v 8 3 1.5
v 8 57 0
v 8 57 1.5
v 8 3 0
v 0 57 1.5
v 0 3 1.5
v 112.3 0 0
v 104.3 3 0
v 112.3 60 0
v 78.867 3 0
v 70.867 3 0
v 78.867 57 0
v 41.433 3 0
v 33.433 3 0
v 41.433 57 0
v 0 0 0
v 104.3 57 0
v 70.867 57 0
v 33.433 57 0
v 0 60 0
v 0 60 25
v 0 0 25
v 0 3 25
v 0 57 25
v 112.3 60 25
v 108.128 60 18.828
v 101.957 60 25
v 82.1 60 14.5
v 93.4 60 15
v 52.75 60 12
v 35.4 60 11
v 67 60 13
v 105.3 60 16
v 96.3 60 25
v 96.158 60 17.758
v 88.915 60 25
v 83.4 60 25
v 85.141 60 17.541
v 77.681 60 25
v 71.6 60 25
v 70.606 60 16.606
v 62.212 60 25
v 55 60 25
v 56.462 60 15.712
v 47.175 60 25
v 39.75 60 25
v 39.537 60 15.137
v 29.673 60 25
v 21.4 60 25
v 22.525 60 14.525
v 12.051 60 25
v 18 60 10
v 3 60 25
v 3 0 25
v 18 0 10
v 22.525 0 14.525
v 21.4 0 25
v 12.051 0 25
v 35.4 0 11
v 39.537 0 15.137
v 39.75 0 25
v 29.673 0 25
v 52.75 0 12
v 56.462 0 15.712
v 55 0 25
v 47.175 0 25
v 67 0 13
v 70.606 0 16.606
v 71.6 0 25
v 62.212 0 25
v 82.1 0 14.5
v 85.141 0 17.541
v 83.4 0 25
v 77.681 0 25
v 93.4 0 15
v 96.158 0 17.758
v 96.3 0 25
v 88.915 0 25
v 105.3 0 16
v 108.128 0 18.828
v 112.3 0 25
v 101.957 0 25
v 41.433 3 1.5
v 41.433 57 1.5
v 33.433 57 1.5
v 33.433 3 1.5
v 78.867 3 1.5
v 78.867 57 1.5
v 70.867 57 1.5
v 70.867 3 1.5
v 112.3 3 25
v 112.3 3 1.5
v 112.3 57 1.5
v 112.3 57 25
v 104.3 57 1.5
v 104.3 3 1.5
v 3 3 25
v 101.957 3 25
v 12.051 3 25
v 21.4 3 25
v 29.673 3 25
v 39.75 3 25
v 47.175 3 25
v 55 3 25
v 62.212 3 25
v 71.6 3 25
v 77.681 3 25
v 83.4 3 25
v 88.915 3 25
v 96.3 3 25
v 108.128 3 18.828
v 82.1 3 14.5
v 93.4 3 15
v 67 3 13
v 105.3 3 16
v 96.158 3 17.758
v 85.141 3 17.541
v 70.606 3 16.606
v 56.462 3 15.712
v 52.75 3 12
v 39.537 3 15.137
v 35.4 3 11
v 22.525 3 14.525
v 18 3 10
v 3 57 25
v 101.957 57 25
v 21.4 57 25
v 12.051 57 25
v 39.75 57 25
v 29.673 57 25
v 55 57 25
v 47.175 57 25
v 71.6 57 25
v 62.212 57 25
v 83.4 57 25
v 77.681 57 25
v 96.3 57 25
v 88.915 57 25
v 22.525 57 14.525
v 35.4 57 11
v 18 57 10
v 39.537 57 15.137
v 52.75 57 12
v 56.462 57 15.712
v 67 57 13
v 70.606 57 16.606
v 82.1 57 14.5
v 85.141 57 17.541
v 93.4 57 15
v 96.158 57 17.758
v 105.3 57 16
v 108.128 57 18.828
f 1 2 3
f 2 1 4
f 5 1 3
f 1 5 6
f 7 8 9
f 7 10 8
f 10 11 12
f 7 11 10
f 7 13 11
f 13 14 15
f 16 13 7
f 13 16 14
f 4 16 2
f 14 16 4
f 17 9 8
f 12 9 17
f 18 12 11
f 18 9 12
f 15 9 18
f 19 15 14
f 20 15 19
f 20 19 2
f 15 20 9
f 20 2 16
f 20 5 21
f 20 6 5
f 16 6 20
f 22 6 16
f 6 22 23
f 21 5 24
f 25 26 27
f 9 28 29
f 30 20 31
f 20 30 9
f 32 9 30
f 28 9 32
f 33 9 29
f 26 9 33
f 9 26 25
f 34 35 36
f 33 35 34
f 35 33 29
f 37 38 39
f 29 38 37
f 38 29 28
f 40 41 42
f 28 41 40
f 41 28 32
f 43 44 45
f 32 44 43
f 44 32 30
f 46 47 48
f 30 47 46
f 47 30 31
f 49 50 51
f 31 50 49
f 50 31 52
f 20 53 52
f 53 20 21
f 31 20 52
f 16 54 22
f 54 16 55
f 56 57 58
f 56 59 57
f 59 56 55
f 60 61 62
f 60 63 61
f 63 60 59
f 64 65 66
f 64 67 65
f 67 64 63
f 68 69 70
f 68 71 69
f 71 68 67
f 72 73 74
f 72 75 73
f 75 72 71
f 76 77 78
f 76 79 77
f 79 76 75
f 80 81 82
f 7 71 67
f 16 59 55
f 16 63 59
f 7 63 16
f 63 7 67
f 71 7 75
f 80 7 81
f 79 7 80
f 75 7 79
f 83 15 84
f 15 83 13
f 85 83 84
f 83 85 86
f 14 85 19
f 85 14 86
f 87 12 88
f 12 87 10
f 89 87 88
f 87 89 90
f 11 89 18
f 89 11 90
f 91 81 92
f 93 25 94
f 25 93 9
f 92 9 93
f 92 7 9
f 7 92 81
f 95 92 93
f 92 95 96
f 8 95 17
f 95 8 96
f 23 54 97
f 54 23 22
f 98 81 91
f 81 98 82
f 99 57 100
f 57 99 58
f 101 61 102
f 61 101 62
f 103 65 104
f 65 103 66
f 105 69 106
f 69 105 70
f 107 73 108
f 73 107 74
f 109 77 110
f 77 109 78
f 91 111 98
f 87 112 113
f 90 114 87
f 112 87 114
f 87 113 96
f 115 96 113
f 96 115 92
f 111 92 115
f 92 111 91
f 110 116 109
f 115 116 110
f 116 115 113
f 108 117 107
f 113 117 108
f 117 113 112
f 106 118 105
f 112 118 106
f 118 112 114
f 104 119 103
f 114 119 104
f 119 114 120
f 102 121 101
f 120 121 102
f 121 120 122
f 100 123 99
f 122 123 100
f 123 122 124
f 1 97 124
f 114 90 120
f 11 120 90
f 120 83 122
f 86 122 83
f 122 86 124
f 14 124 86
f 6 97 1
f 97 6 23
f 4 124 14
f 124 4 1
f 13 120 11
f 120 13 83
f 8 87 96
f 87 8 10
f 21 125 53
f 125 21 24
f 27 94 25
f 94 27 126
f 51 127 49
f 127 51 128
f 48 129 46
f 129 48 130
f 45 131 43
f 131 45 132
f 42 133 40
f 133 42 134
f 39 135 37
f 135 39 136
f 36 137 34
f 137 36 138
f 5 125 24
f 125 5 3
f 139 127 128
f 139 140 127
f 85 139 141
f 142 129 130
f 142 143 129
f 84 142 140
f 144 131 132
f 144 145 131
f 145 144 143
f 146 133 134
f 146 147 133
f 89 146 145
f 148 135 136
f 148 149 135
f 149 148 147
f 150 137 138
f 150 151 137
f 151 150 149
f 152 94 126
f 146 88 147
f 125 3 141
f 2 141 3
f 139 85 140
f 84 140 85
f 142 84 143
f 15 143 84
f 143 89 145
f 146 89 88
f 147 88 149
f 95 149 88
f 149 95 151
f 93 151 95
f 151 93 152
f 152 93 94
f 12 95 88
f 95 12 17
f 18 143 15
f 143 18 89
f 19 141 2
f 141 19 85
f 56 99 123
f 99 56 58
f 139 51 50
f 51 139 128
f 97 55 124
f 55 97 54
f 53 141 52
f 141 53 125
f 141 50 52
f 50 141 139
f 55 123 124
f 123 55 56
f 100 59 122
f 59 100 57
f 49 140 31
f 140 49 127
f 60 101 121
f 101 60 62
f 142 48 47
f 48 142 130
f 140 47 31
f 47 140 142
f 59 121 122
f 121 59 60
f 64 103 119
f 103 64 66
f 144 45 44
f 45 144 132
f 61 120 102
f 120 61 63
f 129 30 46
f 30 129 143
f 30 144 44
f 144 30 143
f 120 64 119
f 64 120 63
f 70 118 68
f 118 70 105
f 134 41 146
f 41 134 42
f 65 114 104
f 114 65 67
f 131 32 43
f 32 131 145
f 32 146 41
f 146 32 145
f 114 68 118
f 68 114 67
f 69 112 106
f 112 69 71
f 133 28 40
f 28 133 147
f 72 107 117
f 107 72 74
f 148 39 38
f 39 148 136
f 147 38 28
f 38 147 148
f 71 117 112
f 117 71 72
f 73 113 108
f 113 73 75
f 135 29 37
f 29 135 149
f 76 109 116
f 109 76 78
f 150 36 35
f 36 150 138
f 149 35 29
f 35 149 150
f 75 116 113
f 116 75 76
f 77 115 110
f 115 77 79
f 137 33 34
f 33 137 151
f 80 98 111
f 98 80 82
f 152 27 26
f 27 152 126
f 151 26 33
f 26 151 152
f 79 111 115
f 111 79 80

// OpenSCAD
//                  3/4    5/8   9/16    1/2   7/16    3/8   5/16
widths        = [  6.40,  5.85,  5.25,  5.10,  4.30,  3.90,  4.00];
spacing       = [ 11,    11.5,   9,    10,     7,     8,     8];
pocket_depth  = [ 15,    14,    13,    12,    10.5,  10,     9];

base_width  = 60.0;
rail_width  =  3.0;
rail_height = 25.0;
cross_bars  =  4;

function sum (v, i = 0, r = 0) = i < len (v) ? sum (v, i + 1, r + v [i]) : r;
function subarray (list, begin = 0, end = -1) = [
  let (end = end < 0 ? len (list) : end)
    for (i = [begin : 1 : end - 1])
      list [i]
];

length = sum (widths) + sum (spacing) + 13;

difference () {
  union () {
    for (i = [0 : cross_bars - 1])
      translate ([i == 0 ? 0 : ((length / (cross_bars - 1)) * i) - (i == (cross_bars - 1) ? 8 : 4), 0, 0])
        cube ([8, base_width, 1.5]);
    translate ([0, 0, 0])
      cube ([length, rail_width, rail_height]);
    translate ([0, base_width - rail_width, 0])
      cube ([length, rail_width, rail_height]);
  }

  for (i = [0 : len (widths) - 1]) {
    translate ([18 + sum (subarray (spacing, 0, i)) + sum (subarray (widths, 0, i)), -0.01, rail_height - pocket_depth [i]])
      rotate ([0, 315, 0])
        cube ([widths [i], base_width + 0.02, 25]);
  }
}
